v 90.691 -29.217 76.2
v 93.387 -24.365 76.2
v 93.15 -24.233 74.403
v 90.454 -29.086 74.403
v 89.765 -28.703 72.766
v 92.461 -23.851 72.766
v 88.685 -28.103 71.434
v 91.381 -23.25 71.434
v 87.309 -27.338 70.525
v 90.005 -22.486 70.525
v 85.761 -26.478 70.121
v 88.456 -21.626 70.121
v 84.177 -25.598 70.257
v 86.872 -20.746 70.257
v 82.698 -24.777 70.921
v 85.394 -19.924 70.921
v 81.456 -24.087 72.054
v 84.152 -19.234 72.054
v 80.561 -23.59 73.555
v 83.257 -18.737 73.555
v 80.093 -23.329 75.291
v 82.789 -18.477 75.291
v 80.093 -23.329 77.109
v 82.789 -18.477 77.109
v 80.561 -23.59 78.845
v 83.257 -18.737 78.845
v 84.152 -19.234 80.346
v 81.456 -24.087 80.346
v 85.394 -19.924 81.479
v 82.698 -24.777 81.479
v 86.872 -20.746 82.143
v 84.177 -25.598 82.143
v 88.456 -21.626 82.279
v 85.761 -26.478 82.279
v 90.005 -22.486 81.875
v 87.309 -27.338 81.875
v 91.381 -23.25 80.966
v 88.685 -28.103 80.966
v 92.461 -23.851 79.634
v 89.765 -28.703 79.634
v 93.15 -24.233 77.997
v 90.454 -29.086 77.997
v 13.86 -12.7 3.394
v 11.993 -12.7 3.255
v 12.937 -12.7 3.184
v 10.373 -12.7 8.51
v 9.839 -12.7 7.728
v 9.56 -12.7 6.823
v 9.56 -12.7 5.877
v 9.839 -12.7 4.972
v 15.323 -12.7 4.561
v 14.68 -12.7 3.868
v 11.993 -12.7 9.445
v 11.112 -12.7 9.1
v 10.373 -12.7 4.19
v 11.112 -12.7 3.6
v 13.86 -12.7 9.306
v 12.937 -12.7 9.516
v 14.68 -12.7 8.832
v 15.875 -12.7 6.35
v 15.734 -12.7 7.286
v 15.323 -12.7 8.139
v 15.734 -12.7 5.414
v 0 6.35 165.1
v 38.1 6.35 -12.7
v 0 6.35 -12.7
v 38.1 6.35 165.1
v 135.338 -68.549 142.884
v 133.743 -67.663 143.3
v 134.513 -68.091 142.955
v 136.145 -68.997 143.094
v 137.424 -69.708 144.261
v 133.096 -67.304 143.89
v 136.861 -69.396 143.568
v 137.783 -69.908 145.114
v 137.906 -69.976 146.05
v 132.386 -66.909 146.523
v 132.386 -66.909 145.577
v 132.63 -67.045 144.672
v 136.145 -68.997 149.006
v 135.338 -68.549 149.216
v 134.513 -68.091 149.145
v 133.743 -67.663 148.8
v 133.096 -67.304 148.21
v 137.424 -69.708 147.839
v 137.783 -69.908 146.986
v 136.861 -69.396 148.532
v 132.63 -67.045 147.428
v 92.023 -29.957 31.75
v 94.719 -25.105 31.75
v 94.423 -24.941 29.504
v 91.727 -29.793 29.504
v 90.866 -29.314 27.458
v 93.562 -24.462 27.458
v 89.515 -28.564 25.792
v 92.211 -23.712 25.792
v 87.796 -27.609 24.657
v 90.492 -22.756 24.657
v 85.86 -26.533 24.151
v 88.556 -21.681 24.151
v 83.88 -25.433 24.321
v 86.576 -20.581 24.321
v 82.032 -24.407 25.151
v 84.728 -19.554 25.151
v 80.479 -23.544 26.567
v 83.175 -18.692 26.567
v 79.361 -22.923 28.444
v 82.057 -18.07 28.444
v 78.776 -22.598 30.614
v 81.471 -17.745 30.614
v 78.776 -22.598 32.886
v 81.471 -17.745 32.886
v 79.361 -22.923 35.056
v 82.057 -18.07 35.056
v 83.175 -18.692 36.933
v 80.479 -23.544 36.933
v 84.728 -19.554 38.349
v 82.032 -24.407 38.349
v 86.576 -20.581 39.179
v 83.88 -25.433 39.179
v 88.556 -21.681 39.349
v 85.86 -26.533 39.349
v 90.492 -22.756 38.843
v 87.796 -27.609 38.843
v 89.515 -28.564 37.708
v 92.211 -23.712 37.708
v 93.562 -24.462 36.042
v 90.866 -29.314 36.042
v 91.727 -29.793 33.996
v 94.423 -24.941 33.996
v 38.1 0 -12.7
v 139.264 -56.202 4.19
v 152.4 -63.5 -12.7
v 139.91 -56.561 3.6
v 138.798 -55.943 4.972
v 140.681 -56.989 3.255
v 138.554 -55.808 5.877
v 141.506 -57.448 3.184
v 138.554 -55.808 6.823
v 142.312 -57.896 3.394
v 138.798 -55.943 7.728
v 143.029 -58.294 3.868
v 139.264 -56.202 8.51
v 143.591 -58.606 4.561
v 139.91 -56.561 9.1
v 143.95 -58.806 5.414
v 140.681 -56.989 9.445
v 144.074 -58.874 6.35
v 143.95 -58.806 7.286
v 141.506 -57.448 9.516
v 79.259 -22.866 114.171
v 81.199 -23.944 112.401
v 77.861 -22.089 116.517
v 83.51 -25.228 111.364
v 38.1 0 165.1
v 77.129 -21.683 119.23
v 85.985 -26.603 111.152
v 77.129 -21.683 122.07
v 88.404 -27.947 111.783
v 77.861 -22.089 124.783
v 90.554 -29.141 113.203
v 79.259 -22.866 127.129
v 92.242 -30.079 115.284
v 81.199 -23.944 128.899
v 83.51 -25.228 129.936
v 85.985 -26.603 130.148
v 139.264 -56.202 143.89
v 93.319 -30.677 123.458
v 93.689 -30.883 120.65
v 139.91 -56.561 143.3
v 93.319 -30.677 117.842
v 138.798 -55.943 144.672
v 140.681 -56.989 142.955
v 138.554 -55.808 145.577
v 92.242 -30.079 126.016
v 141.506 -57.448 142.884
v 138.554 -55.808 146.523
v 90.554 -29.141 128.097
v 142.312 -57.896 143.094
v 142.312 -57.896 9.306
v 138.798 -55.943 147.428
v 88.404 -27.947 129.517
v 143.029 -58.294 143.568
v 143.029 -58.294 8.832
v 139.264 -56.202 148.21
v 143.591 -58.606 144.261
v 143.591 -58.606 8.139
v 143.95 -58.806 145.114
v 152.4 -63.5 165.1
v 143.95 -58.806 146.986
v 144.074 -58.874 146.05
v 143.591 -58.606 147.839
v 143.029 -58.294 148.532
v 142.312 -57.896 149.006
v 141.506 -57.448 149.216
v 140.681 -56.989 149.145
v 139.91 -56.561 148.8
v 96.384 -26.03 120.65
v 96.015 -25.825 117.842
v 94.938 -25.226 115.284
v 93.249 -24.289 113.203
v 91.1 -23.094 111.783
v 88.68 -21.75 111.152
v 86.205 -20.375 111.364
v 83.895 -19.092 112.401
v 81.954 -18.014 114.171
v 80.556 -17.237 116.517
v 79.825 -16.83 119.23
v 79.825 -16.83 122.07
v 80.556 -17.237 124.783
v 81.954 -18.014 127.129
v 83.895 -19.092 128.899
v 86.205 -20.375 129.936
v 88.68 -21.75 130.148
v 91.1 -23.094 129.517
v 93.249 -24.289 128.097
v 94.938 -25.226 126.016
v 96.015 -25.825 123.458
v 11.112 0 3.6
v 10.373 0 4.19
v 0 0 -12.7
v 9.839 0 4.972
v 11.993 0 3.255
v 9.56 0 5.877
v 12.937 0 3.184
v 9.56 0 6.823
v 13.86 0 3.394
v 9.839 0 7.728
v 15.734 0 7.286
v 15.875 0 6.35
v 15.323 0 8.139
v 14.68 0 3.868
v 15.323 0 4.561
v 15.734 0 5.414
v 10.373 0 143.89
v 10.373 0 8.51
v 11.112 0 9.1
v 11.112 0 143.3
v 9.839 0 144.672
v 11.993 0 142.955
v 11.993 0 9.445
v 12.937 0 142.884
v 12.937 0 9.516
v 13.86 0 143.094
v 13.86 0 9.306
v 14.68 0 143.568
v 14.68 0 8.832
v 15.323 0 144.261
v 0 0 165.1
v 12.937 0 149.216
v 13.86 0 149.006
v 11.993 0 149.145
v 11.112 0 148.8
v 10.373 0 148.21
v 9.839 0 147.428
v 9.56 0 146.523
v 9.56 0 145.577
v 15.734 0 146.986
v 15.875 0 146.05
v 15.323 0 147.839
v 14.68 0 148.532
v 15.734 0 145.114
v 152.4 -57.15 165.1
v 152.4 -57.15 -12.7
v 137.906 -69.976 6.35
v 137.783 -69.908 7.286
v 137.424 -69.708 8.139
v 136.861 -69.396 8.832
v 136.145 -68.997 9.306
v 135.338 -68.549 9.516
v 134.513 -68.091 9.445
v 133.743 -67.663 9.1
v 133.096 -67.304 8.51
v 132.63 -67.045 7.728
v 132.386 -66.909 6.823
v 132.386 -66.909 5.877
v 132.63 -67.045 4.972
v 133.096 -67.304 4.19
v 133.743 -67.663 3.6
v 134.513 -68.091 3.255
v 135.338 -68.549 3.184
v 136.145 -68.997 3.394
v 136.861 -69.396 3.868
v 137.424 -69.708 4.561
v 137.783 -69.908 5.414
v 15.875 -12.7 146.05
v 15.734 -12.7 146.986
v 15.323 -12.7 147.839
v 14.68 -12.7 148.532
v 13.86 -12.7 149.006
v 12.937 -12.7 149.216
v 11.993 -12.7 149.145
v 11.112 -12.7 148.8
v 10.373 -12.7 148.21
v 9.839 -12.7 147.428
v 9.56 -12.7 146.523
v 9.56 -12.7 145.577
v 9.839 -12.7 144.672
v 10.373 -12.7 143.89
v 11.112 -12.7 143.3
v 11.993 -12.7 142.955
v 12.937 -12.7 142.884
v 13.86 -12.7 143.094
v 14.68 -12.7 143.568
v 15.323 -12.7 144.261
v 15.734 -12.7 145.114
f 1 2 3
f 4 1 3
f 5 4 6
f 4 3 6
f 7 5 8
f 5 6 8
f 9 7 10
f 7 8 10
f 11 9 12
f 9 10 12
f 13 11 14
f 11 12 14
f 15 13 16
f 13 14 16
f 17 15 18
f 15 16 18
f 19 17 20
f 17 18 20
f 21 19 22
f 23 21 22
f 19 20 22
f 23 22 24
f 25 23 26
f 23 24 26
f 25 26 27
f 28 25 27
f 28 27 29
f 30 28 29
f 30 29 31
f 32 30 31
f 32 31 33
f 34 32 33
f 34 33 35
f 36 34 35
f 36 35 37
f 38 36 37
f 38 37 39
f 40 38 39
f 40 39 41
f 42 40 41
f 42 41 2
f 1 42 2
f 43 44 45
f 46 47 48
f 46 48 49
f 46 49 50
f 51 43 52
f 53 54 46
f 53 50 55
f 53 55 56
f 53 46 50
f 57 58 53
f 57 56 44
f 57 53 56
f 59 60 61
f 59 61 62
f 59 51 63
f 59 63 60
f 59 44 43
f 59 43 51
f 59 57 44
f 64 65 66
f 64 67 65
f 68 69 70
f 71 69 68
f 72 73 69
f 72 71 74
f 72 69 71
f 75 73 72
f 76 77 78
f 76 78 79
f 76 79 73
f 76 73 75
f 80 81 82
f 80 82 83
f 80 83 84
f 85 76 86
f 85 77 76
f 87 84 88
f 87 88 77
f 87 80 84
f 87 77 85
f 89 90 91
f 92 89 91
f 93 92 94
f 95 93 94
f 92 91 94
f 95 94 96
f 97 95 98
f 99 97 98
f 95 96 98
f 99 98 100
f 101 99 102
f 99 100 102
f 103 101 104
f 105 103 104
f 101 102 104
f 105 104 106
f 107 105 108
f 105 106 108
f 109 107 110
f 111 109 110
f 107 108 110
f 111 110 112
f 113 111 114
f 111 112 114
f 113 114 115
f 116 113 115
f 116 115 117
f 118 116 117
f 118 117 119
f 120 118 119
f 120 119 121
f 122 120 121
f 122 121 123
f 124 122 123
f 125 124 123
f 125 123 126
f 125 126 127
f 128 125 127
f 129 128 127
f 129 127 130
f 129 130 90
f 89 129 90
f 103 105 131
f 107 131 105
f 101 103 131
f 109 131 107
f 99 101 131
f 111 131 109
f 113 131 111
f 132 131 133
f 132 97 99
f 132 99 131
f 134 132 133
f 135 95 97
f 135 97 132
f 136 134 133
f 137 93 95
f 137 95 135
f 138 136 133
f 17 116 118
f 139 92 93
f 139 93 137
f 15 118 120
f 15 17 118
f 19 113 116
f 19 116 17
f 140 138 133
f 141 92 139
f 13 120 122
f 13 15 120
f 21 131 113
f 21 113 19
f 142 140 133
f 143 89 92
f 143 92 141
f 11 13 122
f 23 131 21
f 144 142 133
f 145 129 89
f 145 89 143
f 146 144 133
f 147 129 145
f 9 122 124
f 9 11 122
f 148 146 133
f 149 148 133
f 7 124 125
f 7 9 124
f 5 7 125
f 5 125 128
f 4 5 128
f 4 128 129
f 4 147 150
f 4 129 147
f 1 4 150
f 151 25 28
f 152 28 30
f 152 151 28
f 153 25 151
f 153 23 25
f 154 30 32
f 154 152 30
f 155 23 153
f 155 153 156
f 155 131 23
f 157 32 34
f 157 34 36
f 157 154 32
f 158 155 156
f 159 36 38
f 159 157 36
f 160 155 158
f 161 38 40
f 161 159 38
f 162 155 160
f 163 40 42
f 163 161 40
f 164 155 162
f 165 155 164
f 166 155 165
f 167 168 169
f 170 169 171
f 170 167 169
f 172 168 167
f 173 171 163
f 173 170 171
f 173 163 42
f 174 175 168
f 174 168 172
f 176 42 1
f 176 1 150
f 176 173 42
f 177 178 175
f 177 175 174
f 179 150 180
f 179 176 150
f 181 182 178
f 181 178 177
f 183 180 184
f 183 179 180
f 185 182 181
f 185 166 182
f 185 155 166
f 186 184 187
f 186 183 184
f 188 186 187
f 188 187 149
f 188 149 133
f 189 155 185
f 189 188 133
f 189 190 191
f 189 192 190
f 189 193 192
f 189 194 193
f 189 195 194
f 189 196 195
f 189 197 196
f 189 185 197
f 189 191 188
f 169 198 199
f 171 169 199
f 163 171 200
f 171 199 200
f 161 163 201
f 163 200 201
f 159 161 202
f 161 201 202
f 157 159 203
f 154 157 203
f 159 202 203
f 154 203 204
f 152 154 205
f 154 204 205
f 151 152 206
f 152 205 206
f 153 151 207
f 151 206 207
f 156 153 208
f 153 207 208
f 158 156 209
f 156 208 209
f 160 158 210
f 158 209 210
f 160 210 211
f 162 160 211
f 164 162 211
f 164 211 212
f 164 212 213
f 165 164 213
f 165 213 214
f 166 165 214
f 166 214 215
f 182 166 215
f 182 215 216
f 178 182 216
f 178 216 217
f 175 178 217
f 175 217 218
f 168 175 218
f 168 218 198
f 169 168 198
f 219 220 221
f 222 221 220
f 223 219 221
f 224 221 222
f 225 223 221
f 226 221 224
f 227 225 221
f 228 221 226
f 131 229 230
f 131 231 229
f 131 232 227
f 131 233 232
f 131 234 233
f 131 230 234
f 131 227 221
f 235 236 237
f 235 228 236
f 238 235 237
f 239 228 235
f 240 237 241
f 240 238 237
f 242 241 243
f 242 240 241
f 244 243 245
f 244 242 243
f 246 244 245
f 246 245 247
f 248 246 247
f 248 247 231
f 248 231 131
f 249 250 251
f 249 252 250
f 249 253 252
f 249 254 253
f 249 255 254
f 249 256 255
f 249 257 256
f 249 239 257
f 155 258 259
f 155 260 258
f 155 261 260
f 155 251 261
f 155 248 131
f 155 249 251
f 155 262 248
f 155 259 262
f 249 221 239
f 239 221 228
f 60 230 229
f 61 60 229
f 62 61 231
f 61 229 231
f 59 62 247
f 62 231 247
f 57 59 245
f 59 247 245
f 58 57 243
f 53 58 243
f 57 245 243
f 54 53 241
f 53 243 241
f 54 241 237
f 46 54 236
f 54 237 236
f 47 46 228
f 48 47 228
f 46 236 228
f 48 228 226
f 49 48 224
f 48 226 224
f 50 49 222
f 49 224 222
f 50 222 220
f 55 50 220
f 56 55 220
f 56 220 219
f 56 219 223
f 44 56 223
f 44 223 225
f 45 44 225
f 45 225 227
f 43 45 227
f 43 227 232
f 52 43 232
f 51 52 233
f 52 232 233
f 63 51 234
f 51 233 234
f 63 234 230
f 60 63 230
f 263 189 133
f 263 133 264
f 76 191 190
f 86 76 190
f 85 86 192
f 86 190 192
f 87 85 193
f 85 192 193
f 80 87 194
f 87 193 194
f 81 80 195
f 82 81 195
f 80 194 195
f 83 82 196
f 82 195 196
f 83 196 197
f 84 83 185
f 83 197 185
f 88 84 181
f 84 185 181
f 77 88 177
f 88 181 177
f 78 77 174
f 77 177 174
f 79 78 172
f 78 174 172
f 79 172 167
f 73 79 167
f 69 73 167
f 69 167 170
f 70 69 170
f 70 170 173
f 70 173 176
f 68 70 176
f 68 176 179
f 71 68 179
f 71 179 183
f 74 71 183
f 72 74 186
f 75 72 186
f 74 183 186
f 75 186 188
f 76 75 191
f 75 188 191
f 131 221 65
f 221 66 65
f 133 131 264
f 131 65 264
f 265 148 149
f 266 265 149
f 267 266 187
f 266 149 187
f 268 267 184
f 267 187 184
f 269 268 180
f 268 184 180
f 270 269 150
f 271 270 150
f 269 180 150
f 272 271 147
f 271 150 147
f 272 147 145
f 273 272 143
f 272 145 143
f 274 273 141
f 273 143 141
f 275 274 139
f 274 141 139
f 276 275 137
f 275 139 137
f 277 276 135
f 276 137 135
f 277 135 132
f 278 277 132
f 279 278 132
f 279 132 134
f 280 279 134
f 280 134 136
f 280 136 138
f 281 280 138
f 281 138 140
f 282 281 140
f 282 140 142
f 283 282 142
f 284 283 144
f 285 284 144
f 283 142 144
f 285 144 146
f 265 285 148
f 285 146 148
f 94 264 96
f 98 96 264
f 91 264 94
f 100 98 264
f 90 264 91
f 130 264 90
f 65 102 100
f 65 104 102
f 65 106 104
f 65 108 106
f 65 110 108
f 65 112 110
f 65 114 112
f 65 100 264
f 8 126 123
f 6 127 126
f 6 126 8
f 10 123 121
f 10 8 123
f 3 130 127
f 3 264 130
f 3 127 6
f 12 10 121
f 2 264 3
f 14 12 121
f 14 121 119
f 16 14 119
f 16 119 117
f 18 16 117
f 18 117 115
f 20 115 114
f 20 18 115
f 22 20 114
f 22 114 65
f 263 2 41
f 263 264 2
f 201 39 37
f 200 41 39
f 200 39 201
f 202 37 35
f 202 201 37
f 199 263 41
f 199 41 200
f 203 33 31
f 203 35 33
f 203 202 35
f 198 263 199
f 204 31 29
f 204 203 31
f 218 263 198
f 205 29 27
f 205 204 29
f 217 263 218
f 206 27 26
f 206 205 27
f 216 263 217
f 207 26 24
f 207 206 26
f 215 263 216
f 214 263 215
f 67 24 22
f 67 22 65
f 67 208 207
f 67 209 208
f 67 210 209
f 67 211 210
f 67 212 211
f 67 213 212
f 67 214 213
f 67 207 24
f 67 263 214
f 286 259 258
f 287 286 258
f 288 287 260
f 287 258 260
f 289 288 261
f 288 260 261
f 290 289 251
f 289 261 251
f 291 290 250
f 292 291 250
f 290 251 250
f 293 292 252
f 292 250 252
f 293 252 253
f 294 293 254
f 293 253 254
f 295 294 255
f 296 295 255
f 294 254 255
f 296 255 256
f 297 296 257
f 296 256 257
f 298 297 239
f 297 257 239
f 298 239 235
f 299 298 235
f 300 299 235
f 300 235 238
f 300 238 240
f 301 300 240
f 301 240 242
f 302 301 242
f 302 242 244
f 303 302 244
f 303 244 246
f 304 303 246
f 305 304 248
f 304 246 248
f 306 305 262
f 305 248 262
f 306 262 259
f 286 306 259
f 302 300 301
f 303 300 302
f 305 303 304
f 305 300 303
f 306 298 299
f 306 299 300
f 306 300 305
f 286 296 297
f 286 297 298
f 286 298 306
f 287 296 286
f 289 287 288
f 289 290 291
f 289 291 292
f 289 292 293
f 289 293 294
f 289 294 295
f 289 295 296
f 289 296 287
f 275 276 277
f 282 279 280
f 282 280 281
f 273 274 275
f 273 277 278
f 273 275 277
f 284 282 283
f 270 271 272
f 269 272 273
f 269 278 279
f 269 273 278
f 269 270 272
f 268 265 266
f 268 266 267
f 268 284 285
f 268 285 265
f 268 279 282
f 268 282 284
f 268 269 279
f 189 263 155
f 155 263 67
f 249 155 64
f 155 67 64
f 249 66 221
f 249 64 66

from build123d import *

# Parameters (mm, degrees)
BOSS_EXTRUDE1_DEPTH = 152.4
SKETCH2_R           = 9.525
SKETCH2_R_2         = 6.096
SKETCH2_R_3         = 7.62
CUT_EXTRUDE1_DEPTH  = 152.4
SKETCH3_R           = 3.175
BOSS_EXTRUDE2_DEPTH = 12.7
SKETCH4_R           = 3.175
BOSS_EXTRUDE3_DEPTH = 12.7
BOSS_EXTRUDE5_DEPTH = 12.7
BOSS_EXTRUDE6_DEPTH = 12.7


with BuildPart() as part:
    # Sketch1 → Boss-Extrude1 (new body)
    with BuildSketch(Plane.XY):
        Polygon((0, 0), (38.1, 0), (152.4, -63.5), (152.4, -57.15), (38.1, 6.35), (0, 6.35), align=None)
    extrude(amount=BOSS_EXTRUDE1_DEPTH)

    # Sketch2 → Cut-Extrude1 (cut)
    with BuildSketch(Plane(origin=(11.681603774, 21.026886792, 0), x_dir=(0.874157276, -0.485642931, 0), z_dir=(0.485642931, 0.874157276, 0))):
        with Locations((87.371559607, -120.65)):
            Circle(SKETCH2_R)
        with Locations((87.371559607, -76.2)):
            Circle(SKETCH2_R_2)
        with Locations((87.371559607, -31.75)):
            Circle(SKETCH2_R_3)
    extrude(amount=-CUT_EXTRUDE1_DEPTH, mode=Mode.SUBTRACT)

    # Sketch3 → Boss-Extrude2 (add)
    with BuildSketch(Plane.XZ):
        with Locations((12.7, 6.35)):
            Circle(SKETCH3_R)
        with Locations((12.7, 146.05)):
            Circle(SKETCH3_R)
    extrude(amount=BOSS_EXTRUDE2_DEPTH)

    # Sketch4 → Boss-Extrude3 (add)
    with BuildSketch(Plane(origin=(8.985849057, 16.174528302, 0), x_dir=(0.874157276, -0.485642931, 0), z_dir=(-0.485642931, -0.874157276, 0))):
        with Locations((151.359895011, 6.35)):
            Circle(SKETCH4_R)
        with Locations((151.359895011, 146.05)):
            Circle(SKETCH4_R)
    extrude(amount=BOSS_EXTRUDE3_DEPTH)

    # Sketch7 → Boss-Extrude5 (add)
    with BuildSketch(Plane.XY.offset(152.4)):
        Polygon((0, 0), (0, 6.35), (38.1, 6.35), (152.4, -57.15), (152.4, -63.5), (38.1, 0), align=None)
    extrude(amount=BOSS_EXTRUDE5_DEPTH)

    # Sketch8 → Boss-Extrude6 (add)
    with BuildSketch(Plane(origin=(0, 0, 0), x_dir=(-1, 0, 0), z_dir=(0, 0, -1))):
        Polygon((0, 0), (-38.1, 0), (-152.4, -63.5), (-152.4, -57.15), (-38.1, 6.35), (0, 6.35), align=None)
    extrude(amount=BOSS_EXTRUDE6_DEPTH)


solid = part.part
